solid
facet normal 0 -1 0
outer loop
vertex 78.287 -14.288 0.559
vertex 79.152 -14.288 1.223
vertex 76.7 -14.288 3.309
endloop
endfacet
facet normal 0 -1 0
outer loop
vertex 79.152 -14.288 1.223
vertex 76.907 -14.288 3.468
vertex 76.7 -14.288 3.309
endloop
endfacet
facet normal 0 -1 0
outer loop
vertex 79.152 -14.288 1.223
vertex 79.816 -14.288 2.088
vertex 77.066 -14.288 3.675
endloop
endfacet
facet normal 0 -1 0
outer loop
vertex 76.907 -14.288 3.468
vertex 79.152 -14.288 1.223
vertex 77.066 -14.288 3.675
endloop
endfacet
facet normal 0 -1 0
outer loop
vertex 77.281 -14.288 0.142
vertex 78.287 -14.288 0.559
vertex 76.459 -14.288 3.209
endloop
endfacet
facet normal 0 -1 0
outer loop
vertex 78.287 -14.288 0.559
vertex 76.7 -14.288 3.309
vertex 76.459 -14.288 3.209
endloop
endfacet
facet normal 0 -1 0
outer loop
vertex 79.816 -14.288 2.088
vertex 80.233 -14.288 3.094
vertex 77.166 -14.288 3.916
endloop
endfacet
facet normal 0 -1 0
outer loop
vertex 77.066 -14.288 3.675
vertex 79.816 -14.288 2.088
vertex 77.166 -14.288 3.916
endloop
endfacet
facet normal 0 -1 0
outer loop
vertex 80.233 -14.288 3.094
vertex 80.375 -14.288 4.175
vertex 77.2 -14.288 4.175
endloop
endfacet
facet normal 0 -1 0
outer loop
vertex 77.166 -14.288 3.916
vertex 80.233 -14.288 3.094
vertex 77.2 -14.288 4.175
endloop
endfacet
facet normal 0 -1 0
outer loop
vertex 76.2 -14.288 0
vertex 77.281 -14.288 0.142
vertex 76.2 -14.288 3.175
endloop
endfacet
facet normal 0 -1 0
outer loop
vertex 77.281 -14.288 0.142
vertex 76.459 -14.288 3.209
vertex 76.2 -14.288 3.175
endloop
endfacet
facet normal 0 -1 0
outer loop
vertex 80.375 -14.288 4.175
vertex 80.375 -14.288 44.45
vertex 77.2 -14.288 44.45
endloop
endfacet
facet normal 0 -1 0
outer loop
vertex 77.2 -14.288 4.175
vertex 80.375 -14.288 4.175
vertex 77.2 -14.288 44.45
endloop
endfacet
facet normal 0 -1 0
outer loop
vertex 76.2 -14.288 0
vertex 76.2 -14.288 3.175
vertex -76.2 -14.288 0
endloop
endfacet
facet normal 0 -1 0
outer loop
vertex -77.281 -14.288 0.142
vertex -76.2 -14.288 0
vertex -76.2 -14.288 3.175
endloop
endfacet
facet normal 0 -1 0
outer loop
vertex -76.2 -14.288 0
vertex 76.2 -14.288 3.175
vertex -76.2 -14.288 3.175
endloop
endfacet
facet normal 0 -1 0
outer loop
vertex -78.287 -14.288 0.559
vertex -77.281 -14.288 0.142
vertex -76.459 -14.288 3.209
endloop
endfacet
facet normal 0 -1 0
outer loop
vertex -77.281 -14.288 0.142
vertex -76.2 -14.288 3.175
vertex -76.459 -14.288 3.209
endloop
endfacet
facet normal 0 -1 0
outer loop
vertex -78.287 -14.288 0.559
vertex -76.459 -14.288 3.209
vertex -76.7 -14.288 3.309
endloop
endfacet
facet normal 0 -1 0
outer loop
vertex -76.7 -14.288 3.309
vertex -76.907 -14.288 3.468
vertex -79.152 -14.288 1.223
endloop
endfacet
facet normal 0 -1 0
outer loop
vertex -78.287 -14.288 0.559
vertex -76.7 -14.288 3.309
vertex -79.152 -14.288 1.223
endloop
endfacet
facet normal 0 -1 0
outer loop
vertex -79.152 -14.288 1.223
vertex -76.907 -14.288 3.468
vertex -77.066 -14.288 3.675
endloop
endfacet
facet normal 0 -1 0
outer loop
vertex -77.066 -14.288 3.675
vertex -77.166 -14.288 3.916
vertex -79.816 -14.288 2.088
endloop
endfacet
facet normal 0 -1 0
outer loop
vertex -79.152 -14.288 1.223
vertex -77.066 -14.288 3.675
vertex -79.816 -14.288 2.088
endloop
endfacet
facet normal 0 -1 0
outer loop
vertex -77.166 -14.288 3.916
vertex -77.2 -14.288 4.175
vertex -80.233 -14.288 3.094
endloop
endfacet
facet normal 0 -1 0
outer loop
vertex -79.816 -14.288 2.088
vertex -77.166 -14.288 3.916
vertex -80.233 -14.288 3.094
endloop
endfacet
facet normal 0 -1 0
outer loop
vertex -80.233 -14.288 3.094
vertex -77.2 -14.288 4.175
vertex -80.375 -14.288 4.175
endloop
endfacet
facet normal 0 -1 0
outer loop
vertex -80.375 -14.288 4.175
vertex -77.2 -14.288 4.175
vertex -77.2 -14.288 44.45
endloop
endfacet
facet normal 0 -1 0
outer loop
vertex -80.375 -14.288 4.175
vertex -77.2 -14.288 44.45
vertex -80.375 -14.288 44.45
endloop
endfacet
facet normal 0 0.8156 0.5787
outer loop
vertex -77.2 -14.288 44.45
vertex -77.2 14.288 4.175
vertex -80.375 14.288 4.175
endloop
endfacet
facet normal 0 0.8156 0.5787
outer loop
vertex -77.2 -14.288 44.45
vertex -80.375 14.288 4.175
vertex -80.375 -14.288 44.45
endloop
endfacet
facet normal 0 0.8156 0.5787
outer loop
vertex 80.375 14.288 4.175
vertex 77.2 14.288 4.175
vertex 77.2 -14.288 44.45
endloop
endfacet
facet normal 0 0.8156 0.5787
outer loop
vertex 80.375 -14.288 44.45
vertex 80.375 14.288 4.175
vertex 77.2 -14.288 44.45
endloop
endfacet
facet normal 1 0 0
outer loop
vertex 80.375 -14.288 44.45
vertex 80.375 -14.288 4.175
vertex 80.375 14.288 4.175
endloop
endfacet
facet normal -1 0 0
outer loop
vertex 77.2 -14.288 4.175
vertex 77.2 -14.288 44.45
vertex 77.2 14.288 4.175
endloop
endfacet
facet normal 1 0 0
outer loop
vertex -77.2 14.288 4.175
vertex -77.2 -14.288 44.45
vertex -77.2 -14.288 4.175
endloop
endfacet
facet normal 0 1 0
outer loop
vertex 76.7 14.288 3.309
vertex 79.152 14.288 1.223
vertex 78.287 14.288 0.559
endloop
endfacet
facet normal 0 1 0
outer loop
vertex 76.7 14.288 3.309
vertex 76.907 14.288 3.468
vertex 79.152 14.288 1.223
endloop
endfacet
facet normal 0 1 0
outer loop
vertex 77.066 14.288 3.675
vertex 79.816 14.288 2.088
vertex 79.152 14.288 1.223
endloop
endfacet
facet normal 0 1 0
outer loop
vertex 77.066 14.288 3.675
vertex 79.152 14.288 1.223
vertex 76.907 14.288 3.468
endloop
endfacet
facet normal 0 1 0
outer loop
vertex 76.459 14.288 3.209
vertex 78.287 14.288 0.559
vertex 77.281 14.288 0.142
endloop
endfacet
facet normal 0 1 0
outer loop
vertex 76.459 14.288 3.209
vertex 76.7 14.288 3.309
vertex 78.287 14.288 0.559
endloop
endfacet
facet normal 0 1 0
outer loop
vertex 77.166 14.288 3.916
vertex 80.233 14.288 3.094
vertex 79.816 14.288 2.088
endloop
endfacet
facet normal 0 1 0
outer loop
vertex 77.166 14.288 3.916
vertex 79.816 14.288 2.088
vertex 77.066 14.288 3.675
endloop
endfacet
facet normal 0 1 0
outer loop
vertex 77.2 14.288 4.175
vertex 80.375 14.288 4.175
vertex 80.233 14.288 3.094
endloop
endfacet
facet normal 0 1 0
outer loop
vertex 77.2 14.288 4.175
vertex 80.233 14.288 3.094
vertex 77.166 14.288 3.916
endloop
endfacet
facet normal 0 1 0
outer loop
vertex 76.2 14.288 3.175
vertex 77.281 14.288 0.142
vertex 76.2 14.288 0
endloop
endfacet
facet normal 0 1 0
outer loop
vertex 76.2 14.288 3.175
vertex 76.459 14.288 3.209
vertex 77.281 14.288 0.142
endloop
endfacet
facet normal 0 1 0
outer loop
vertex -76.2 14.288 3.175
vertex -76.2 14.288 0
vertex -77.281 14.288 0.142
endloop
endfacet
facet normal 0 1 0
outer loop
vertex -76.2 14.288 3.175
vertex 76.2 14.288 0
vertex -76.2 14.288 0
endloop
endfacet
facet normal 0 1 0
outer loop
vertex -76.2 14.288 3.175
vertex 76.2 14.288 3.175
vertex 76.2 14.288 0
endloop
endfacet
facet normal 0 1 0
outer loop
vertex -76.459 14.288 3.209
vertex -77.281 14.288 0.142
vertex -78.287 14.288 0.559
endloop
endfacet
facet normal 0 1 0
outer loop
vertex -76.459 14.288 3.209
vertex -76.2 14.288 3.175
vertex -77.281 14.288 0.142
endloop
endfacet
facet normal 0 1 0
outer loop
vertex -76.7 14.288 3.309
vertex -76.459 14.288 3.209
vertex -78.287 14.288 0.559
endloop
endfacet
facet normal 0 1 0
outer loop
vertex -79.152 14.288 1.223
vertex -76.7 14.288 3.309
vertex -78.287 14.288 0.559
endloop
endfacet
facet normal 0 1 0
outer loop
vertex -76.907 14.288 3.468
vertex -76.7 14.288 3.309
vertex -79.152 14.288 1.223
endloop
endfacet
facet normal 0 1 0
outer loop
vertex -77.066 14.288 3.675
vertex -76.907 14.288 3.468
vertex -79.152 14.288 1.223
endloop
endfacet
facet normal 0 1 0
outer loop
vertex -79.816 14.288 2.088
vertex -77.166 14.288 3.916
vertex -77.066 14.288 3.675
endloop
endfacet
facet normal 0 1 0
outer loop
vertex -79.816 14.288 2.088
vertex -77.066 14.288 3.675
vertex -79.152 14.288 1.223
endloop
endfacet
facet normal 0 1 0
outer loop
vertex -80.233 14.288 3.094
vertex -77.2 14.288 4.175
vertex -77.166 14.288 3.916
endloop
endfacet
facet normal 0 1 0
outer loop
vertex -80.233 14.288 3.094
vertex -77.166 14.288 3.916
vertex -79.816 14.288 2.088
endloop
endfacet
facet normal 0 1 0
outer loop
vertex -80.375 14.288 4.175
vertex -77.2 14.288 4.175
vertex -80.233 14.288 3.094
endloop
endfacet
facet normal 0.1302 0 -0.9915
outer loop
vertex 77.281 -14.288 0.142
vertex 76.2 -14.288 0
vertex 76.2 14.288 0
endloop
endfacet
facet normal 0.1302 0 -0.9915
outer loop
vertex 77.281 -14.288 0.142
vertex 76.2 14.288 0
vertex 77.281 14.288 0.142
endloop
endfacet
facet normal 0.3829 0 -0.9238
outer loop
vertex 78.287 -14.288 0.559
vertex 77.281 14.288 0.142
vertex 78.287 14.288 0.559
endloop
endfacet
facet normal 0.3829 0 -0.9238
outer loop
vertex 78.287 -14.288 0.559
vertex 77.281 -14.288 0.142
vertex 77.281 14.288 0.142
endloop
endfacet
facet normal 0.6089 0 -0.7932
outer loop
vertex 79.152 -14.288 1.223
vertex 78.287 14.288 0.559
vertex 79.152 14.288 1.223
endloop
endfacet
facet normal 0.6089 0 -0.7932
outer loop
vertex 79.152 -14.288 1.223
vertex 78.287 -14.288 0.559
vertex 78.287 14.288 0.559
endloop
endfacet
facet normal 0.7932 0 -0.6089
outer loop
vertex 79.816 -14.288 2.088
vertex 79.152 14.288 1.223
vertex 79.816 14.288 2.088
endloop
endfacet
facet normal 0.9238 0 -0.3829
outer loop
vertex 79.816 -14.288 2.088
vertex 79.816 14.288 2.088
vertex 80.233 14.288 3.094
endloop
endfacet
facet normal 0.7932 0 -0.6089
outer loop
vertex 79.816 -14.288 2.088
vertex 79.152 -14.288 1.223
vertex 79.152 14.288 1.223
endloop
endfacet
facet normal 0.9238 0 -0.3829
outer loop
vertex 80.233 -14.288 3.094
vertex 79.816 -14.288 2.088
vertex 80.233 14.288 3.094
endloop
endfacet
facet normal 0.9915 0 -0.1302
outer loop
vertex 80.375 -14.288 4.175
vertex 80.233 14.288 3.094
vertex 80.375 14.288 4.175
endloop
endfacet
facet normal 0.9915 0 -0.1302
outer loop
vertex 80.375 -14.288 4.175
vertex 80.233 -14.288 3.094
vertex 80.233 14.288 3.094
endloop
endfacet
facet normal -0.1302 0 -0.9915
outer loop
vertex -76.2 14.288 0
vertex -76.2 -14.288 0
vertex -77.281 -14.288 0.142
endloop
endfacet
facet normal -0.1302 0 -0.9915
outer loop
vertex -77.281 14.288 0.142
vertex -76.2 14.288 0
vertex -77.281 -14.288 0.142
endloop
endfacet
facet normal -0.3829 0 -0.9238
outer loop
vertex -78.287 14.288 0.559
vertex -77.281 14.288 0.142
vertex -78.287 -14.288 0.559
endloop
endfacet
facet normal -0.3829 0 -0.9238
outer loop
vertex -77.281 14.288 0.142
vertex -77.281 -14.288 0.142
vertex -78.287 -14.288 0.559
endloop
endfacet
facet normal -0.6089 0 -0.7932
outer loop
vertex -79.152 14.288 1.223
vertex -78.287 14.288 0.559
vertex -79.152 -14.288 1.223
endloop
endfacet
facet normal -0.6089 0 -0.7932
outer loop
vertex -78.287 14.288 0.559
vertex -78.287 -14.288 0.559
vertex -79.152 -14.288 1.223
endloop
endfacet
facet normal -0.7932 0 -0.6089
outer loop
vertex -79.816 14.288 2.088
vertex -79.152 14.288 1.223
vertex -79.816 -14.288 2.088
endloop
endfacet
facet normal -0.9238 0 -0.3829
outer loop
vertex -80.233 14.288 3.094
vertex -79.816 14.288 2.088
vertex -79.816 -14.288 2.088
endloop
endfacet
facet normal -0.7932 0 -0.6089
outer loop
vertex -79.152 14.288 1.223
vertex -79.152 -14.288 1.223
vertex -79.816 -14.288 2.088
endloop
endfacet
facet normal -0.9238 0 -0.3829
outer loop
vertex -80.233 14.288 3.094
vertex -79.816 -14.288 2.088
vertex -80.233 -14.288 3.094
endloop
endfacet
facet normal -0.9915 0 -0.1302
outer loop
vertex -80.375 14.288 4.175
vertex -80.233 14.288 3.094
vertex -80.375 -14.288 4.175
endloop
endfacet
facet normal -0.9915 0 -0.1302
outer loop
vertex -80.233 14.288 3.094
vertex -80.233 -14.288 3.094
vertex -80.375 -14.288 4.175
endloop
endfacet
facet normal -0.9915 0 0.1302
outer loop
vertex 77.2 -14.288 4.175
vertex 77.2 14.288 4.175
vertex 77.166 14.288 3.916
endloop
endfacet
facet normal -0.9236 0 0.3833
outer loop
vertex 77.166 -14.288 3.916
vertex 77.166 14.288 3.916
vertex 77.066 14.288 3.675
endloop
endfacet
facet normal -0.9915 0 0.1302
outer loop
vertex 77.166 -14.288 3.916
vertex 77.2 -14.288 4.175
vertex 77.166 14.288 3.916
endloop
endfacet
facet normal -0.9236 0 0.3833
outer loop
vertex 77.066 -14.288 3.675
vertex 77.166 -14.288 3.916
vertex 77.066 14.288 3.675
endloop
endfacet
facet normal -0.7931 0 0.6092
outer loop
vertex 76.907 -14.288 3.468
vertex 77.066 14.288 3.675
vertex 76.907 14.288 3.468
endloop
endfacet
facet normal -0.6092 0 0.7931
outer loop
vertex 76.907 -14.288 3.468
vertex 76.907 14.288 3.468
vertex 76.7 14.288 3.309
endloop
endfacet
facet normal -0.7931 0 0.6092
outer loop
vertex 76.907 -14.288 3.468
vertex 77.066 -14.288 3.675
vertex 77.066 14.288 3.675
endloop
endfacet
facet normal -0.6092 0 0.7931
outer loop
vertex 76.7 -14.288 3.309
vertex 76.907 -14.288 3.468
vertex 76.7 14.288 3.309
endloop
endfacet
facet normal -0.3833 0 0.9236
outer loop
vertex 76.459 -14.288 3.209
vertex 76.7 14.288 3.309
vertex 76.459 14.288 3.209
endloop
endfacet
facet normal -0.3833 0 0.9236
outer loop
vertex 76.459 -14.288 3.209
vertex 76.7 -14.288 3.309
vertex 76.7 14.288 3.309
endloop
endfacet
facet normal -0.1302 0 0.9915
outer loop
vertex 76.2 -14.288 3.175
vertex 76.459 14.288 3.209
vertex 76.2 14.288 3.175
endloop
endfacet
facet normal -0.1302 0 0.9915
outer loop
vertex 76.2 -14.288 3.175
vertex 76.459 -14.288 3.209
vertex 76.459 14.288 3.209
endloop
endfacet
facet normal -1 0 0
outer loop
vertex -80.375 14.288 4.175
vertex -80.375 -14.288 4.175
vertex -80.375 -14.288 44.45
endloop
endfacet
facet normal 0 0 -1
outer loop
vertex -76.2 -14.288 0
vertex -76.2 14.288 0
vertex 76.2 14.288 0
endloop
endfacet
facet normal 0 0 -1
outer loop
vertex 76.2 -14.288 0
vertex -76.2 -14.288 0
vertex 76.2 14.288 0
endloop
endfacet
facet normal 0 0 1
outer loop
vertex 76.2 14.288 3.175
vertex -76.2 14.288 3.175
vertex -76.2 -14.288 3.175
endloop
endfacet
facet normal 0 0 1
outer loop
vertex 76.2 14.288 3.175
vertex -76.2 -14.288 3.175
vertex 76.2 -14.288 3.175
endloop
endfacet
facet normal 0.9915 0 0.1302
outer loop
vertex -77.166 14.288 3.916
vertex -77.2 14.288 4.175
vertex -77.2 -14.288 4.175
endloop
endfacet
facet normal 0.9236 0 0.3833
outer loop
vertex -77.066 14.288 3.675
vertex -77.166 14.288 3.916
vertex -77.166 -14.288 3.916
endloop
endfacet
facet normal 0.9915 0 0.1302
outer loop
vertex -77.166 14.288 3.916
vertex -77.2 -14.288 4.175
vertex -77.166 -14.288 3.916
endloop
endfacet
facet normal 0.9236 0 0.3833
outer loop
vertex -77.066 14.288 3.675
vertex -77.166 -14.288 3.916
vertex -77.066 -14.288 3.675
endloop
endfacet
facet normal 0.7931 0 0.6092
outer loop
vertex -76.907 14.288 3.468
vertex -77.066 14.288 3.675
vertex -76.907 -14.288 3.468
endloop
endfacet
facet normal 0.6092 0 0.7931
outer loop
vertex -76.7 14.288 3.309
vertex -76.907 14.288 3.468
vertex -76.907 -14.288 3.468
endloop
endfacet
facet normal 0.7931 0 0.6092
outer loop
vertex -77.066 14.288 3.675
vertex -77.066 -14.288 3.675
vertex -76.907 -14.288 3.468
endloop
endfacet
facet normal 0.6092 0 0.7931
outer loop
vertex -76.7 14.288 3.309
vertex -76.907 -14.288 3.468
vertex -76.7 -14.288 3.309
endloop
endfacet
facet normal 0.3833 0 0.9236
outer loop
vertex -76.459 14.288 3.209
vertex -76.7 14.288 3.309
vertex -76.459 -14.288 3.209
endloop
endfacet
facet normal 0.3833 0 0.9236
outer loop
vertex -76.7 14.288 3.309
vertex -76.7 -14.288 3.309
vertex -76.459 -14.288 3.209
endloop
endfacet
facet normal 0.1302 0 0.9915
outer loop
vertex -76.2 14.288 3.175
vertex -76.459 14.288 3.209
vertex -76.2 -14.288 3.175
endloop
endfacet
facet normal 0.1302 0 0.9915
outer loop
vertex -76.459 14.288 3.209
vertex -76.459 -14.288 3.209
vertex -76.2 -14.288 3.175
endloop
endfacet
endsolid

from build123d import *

# Parameters (mm, degrees)
SKETCH2_W          = 152.4
SKETCH2_H          = 28.575
BASE_FLANGE1_DEPTH = 3.175
EDGE_FLANGE1_DEPTH = 28.575
CUT_EXTRUDE1_START = -3.175
CUT_EXTRUDE1_DEPTH = 167.563083351


# Sheet-metal steps are written as plain solids
with BuildPart() as part:
    # Sketch2 → Base-Flange1 (new body)
    with BuildSketch(Plane.XY):
        Rectangle(SKETCH2_W, SKETCH2_H)
    extrude(amount=BASE_FLANGE1_DEPTH)

    # Edge-Flange1 section (across the edge) → Edge-Flange1 (add)
    with BuildSketch(Plane(origin=(77.2, -14.2875, 3.175), x_dir=(-1, 0, 0), z_dir=(0, 1, 0))):
        with BuildLine():
            Line((-3.175, 1), (-3.175, 41.275))
            Line((-3.175, 41.275), (0, 41.275))
            Line((0, 41.275), (0, 1))
            ThreePointArc((0, 1), (0.292893219, 0.292893219), (1, 0))
            Line((1, 0), (1, -3.175))
            ThreePointArc((1, -3.175), (-1.952170811, -1.952170811), (-3.175, 1))
        make_face()
    edge_flange1 = extrude(amount=EDGE_FLANGE1_DEPTH)

    # Sketch10 → Cut-Extrude1 (cut)
    with BuildSketch(Plane(origin=(80.375, 0, 0), x_dir=(0, 0, -1), z_dir=(1, 0, 0)).offset(CUT_EXTRUDE1_START)):
        Polygon((-4.175, 14.2875), (-44.45, -14.2875), (-44.45, 14.2875), align=None)
    cut_extrude1 = extrude(amount=CUT_EXTRUDE1_DEPTH, mode=Mode.SUBTRACT)

    # Mirror1: Edge-Flange1, Cut-Extrude1 across plane
    add(edge_flange1.mirror(Plane(origin=(0, 0, 0), x_dir=(0, 0, 1), z_dir=(1, 0, 0))))
    add(cut_extrude1.mirror(Plane(origin=(0, 0, 0), x_dir=(0, 0, 1), z_dir=(1, 0, 0))), mode=Mode.SUBTRACT)


solid = part.part
